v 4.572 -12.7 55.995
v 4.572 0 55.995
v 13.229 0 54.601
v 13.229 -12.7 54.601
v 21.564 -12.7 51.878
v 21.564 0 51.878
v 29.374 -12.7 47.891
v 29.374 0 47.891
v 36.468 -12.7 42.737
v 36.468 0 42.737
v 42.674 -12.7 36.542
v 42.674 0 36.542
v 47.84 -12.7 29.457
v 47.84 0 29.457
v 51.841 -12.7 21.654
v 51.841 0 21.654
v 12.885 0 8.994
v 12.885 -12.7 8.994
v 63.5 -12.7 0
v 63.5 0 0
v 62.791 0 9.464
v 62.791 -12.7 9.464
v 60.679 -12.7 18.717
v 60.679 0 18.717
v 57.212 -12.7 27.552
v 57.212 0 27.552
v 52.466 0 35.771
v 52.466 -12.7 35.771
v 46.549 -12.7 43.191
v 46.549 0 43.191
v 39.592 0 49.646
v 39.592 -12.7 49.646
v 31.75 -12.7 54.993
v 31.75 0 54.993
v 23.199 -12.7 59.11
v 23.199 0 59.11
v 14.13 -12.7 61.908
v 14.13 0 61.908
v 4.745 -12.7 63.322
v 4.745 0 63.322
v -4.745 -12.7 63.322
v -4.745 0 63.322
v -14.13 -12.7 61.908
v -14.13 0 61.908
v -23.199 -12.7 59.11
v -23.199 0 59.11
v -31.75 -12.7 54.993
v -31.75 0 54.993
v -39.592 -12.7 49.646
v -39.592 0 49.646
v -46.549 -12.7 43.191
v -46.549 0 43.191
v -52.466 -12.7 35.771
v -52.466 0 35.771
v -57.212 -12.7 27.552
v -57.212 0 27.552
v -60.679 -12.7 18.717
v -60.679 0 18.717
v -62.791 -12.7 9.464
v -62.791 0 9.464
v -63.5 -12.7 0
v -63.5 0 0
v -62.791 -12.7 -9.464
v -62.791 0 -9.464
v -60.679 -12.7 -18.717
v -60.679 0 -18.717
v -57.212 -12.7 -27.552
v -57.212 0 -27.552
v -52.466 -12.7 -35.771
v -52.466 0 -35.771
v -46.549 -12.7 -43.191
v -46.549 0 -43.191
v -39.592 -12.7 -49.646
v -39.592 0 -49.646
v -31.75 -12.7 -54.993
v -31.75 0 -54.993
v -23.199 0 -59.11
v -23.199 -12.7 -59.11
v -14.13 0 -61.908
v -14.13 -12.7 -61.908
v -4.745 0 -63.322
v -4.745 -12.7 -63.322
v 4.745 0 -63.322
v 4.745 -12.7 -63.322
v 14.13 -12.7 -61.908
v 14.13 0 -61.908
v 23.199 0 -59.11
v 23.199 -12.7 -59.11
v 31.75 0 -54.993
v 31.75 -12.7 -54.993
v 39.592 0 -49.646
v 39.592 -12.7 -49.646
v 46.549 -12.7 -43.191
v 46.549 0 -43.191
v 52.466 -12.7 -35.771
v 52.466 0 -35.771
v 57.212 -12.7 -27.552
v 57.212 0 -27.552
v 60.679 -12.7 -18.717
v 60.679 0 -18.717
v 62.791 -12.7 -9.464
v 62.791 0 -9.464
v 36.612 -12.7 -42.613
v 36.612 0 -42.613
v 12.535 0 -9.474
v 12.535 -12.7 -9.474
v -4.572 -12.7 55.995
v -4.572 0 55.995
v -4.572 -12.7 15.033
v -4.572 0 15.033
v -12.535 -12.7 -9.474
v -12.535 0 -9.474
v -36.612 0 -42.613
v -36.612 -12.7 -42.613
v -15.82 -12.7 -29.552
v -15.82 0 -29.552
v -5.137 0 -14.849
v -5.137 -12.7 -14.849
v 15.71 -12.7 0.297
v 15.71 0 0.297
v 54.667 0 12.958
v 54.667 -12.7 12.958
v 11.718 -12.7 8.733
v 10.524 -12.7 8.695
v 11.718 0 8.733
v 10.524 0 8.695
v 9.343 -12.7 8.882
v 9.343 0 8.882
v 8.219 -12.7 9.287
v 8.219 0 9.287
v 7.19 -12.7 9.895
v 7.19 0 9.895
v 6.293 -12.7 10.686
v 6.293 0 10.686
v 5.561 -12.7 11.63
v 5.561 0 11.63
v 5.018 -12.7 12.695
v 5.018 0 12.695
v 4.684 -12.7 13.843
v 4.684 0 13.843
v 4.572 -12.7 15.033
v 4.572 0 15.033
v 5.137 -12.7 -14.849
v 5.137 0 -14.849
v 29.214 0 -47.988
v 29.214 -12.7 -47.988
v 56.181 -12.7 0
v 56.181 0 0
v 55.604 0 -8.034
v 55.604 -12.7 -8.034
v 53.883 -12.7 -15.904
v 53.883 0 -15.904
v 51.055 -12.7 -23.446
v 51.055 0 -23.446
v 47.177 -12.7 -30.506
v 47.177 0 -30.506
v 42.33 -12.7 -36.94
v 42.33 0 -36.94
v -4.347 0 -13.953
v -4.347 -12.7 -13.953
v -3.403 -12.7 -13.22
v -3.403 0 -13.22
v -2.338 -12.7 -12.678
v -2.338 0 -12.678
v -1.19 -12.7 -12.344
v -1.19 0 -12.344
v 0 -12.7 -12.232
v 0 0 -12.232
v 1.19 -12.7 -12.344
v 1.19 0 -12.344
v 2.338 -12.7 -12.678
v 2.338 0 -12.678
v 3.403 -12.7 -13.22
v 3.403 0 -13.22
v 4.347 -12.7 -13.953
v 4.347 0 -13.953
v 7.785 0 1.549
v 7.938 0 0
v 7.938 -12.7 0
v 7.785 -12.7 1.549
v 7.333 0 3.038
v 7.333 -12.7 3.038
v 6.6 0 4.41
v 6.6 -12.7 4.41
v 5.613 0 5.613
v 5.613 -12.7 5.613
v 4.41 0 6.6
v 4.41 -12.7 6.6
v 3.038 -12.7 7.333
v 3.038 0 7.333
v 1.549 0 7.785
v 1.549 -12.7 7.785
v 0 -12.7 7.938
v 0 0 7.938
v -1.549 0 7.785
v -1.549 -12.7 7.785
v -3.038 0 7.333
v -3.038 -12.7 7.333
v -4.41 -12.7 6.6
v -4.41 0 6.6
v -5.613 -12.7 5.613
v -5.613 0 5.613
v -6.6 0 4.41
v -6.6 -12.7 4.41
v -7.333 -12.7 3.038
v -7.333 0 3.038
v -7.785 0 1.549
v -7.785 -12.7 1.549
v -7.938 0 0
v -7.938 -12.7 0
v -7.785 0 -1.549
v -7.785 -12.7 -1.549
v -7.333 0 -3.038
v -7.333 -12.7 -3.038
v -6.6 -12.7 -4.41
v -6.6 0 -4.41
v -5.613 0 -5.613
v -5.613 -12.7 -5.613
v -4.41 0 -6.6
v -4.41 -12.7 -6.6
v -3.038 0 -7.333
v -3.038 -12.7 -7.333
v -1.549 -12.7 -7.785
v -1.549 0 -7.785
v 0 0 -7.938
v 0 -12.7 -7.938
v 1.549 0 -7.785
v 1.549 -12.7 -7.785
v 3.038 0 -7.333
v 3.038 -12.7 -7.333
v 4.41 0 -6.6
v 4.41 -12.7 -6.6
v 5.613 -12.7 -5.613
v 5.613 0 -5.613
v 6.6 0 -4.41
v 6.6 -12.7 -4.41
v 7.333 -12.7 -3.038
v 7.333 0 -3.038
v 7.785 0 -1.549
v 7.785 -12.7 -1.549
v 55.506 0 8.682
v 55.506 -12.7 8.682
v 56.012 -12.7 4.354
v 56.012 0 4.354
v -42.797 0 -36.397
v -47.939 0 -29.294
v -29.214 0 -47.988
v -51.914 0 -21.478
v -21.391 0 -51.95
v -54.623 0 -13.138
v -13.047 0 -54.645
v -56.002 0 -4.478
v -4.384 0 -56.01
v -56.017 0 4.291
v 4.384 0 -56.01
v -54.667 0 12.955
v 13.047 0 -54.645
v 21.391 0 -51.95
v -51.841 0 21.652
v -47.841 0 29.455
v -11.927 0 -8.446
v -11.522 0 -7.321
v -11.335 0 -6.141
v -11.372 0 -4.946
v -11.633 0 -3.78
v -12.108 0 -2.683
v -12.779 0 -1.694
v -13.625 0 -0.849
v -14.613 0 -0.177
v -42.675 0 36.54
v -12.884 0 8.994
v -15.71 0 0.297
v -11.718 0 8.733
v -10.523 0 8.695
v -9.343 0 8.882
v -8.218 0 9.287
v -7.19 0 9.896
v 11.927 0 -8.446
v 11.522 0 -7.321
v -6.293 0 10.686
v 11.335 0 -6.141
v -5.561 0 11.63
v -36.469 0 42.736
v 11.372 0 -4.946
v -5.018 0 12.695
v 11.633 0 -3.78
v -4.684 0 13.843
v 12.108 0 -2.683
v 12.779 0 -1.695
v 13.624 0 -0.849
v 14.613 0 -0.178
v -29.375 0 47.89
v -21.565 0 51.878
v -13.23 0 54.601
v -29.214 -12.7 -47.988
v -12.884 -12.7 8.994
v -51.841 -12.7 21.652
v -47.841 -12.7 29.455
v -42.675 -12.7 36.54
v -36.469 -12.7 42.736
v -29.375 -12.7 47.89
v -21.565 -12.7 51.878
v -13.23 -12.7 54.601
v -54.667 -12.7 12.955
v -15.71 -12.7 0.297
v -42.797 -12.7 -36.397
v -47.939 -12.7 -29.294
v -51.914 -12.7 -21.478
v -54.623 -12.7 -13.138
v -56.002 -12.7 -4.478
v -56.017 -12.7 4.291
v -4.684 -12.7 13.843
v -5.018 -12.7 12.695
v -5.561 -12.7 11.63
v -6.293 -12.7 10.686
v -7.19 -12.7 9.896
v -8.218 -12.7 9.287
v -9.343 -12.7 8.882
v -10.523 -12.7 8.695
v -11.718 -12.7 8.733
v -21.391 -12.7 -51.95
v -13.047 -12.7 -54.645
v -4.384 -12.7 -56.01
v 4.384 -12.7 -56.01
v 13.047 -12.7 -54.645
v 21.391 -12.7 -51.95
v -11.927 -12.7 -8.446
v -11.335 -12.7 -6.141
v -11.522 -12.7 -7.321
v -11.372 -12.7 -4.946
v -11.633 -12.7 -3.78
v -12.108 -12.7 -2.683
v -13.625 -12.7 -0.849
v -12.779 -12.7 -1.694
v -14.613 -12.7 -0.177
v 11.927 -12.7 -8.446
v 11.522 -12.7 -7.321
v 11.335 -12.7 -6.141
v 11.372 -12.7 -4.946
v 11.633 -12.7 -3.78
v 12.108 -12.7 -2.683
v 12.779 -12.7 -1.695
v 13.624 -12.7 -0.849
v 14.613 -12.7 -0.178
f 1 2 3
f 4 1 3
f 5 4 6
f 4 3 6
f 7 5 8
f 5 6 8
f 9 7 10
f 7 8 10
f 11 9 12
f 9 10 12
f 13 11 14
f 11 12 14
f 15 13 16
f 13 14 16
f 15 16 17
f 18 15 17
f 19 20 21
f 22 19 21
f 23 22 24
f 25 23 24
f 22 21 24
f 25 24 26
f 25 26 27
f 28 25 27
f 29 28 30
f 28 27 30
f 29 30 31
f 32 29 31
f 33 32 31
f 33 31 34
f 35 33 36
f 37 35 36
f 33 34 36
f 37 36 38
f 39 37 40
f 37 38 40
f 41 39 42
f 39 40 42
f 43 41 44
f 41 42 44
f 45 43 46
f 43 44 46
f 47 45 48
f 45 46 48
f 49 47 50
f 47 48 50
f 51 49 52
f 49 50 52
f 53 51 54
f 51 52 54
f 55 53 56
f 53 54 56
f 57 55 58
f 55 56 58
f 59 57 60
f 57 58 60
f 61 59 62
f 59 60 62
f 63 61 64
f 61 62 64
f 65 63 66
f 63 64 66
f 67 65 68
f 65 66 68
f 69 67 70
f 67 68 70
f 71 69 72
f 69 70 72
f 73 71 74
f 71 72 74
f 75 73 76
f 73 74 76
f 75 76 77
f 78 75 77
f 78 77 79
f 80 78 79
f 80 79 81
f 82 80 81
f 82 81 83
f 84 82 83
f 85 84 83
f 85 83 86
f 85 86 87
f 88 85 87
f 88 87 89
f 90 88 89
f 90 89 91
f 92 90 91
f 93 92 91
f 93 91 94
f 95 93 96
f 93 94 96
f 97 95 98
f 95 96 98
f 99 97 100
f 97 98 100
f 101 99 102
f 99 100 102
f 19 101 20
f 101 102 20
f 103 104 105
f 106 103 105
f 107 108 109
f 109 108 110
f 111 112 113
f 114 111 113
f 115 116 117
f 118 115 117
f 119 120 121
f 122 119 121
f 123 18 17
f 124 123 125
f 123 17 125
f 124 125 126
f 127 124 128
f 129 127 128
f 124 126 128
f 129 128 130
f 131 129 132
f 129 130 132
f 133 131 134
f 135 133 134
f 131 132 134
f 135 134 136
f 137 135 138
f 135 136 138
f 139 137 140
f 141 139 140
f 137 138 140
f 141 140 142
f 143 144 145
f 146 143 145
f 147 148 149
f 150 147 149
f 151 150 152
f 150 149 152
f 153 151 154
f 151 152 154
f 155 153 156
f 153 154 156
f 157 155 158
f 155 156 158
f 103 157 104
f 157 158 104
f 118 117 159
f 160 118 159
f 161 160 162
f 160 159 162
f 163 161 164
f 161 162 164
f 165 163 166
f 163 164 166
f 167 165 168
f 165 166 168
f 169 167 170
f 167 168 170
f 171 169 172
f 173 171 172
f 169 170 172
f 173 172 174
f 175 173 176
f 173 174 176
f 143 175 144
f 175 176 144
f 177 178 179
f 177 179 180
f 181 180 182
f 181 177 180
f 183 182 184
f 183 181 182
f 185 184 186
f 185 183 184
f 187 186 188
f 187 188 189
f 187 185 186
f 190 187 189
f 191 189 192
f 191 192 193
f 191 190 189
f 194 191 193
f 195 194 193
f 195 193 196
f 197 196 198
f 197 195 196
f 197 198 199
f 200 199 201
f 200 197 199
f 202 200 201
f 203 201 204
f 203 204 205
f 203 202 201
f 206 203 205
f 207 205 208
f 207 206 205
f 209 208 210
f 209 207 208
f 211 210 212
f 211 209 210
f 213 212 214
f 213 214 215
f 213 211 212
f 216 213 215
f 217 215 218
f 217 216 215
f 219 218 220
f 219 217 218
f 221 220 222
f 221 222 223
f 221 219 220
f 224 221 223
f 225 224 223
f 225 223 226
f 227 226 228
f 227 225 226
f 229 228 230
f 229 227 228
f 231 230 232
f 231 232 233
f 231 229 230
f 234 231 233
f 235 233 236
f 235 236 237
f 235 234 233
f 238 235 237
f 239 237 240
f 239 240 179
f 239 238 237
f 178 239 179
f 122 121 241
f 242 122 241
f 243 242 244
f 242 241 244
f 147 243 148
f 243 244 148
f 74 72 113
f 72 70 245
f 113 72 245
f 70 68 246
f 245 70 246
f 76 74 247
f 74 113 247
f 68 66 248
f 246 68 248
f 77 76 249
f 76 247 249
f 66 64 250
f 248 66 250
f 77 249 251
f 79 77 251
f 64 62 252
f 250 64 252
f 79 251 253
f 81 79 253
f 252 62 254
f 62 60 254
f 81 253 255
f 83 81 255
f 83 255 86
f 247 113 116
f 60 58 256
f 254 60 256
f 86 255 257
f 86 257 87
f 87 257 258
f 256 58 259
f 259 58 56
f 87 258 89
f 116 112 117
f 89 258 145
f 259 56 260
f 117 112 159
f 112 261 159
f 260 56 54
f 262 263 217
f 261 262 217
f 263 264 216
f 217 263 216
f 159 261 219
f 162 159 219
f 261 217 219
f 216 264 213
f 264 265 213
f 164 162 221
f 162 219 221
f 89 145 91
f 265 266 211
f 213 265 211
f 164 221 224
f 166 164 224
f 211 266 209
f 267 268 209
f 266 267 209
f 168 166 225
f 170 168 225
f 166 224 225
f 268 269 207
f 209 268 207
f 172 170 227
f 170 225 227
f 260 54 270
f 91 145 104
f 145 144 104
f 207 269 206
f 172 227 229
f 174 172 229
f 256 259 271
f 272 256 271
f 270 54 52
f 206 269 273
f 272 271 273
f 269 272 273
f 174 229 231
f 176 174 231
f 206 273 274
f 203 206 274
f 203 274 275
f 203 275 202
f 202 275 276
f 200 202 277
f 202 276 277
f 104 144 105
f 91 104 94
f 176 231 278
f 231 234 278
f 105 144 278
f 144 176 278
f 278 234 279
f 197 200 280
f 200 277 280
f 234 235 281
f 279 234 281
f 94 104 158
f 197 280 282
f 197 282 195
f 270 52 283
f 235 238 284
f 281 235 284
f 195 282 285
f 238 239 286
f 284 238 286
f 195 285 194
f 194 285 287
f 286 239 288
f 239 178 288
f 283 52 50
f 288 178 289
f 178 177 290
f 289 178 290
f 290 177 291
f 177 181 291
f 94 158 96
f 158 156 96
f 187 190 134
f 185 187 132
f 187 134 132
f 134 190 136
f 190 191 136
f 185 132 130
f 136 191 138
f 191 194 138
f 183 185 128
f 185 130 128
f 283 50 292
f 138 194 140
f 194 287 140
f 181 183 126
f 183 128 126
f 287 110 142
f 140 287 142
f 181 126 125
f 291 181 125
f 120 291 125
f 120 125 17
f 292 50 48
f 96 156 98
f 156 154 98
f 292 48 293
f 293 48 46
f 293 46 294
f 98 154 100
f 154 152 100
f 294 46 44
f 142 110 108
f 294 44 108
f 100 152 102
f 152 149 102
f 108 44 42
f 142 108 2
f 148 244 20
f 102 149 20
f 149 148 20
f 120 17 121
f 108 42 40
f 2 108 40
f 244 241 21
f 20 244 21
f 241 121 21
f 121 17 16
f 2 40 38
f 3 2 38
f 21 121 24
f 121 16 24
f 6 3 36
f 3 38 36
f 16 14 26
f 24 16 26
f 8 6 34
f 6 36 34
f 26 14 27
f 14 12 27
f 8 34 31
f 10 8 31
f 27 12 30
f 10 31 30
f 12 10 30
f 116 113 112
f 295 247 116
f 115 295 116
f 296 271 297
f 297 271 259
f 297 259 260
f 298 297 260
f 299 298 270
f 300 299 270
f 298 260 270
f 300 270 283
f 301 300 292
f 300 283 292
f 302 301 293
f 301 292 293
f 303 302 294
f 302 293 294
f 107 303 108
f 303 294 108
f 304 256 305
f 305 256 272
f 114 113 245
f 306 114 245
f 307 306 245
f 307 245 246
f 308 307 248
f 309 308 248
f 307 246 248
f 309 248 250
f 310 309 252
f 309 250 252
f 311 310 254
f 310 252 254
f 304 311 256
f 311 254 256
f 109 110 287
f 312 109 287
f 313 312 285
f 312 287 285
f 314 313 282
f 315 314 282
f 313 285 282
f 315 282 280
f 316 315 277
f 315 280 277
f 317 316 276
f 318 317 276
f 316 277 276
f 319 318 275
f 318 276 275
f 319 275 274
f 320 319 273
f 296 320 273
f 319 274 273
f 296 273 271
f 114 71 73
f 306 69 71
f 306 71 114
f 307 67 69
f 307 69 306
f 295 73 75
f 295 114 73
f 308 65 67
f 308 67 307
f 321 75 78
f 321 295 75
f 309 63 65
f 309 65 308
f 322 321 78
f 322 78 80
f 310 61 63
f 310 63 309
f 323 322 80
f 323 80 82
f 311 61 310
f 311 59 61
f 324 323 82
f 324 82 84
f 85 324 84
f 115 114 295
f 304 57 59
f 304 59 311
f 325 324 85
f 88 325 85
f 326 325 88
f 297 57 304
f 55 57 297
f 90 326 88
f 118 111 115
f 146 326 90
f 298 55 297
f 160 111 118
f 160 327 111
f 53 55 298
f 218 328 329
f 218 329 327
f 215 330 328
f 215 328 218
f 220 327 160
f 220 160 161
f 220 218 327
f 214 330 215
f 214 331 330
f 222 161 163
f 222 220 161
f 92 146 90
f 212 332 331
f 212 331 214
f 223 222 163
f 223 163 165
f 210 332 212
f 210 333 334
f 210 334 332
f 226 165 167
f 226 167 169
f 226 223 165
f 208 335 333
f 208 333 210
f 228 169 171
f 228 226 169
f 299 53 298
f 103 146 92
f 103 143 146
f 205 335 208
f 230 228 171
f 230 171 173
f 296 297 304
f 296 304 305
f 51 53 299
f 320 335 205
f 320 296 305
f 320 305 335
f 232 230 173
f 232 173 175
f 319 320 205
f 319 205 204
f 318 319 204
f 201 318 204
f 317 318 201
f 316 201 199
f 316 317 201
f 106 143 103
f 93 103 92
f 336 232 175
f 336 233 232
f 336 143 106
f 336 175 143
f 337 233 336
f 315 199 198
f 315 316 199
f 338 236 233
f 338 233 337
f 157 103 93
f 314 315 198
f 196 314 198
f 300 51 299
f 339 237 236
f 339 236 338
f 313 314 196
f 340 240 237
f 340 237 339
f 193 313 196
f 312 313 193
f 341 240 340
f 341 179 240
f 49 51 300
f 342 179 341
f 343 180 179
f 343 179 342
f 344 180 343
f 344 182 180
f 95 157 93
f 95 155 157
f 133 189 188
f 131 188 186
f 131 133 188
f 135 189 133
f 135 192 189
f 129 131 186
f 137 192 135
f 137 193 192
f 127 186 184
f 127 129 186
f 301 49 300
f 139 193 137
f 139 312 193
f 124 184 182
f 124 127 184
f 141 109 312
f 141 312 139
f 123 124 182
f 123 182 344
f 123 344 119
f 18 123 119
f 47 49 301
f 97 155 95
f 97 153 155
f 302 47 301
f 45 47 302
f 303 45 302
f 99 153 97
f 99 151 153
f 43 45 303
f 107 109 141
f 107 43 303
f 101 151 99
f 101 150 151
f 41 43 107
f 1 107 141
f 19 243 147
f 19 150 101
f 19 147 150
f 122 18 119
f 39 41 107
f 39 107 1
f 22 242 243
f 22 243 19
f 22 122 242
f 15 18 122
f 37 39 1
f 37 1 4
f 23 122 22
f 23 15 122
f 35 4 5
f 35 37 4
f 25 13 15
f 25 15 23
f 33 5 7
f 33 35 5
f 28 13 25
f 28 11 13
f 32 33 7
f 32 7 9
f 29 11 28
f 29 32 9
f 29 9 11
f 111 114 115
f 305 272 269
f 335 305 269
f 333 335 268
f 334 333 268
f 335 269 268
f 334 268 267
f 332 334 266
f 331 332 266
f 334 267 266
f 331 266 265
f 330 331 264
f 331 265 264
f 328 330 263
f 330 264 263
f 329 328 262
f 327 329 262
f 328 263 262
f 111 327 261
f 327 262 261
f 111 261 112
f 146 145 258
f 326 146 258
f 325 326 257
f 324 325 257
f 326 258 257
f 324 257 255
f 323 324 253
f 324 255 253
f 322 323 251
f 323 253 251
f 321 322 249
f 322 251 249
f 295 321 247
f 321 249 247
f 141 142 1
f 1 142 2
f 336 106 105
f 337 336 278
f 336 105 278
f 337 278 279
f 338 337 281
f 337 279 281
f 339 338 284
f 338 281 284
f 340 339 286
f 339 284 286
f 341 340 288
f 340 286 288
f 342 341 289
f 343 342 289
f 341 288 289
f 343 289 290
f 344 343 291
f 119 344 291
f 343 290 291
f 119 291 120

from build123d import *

# Parameters (mm, degrees)
F0_R     = 63.5
F0_R_2   = 7.9375
F1_DEPTH = 12.7


with BuildPart() as f1:
    # F0 (on Front) → F1 (new body)
    with BuildSketch(Plane.XZ):
        Circle(F0_R)
        with BuildLine():
            ThreePointArc((54.6665564179, 12.9575831816), (55.8012817771, 6.5229061418), (56.1812366587, 0))
            ThreePointArc((56.1812366587, 0), (51.0550069931, -23.4460575244), (36.6117986709, -42.613466775))
            ThreePointArc((36.6117986709, -42.613466775), (33.0225023635, -45.4515752219), (29.2141472743, -47.988175122))
            ThreePointArc((29.2141472743, -47.988175122), (0, -56.1812366587), (-29.2141472743, -47.988175122))
            ThreePointArc((-29.2141472743, -47.988175122), (-33.0225023635, -45.4515752219), (-36.6117986709, -42.613466775))
            ThreePointArc((-36.6117986709, -42.613466775), (-53.4315312178, -17.3609568925), (-54.6671346388, 12.9551434915))
            ThreePointArc((-54.6671346388, 12.9551434915), (-53.4315312178, 17.3609568925), (-51.8414832422, 21.6516042765))
            ThreePointArc((-51.8414832422, 21.6516042765), (-33.0225023635, 45.4515752219), (-4.572, 55.9948941289))
            ThreePointArc((-4.572, 55.9948941289), (0, 56.1812366587), (4.572, 55.9948941289))
            ThreePointArc((4.572, 55.9948941289), (33.0214881574, 45.4523120685), (51.8405169309, 21.6539178173))
            ThreePointArc((51.8405169309, 21.6539178173), (53.4307563802, 17.3633414164), (54.6665564179, 12.9575831816))
        make_face(mode=Mode.SUBTRACT)
        with BuildLine():
            Line((15.7095408853, 0.2970539508), (54.6665564179, 12.9575831816))
            ThreePointArc((54.6665564179, 12.9575831816), (53.4307563802, 17.3633414164), (51.8405169309, 21.6539178173))
            Line((51.8405169309, 21.6539178173), (12.8846263398, 8.993754178))
            ThreePointArc((12.8846263398, 8.993754178), (7.189720352, 9.8954715726), (4.572, 15.0328433354))
            Line((4.572, 15.0328433354), (4.572, 55.9948941289))
            ThreePointArc((4.572, 55.9948941289), (0, 56.1812366587), (-4.572, 55.9948941289))
            Line((-4.572, 55.9948941289), (-4.572, 15.0328433354))
            ThreePointArc((-4.572, 15.0328433354), (-7.1895636479, 9.8955854211), (-12.8842579143, 8.9936344569))
            Line((-12.8842579143, 8.9936344569), (-51.8414832422, 21.6516042765))
            ThreePointArc((-51.8414832422, 21.6516042765), (-53.4315312178, 17.3609568925), (-54.6671346388, 12.9551434915))
            Line((-54.6671346388, 12.9551434915), (-15.7099093108, 0.2971736719))
            ThreePointArc((-15.7099093108, 0.2971736719), (-11.6329583467, -3.7797772923), (-12.5349093108, -9.4744715586))
            Line((-12.5349093108, -9.4744715586), (-36.6117986709, -42.613466775))
            ThreePointArc((-36.6117986709, -42.613466775), (-33.0225023635, -45.4515752219), (-29.2141472743, -47.988175122))
            Line((-29.2141472743, -47.988175122), (-15.8198157406, -29.5524593622))
            Line((-15.8198157406, -29.5524593622), (-5.1372579143, -14.8491799056))
            ThreePointArc((-5.1372579143, -14.8491799056), (0, -12.2316162576), (5.1372579143, -14.8491799056))
            Line((5.1372579143, -14.8491799056), (29.2141472743, -47.988175122))
            ThreePointArc((29.2141472743, -47.988175122), (33.0225023635, -45.4515752219), (36.6117986709, -42.613466775))
            Line((36.6117986709, -42.613466775), (12.5349093108, -9.4744715586))
            ThreePointArc((12.5349093108, -9.4744715586), (11.6328984945, -3.7799615078), (15.7095408853, 0.2970539508))
        make_face()
        Circle(F0_R_2, mode=Mode.SUBTRACT)
    extrude(amount=F1_DEPTH)


solid = f1.part
